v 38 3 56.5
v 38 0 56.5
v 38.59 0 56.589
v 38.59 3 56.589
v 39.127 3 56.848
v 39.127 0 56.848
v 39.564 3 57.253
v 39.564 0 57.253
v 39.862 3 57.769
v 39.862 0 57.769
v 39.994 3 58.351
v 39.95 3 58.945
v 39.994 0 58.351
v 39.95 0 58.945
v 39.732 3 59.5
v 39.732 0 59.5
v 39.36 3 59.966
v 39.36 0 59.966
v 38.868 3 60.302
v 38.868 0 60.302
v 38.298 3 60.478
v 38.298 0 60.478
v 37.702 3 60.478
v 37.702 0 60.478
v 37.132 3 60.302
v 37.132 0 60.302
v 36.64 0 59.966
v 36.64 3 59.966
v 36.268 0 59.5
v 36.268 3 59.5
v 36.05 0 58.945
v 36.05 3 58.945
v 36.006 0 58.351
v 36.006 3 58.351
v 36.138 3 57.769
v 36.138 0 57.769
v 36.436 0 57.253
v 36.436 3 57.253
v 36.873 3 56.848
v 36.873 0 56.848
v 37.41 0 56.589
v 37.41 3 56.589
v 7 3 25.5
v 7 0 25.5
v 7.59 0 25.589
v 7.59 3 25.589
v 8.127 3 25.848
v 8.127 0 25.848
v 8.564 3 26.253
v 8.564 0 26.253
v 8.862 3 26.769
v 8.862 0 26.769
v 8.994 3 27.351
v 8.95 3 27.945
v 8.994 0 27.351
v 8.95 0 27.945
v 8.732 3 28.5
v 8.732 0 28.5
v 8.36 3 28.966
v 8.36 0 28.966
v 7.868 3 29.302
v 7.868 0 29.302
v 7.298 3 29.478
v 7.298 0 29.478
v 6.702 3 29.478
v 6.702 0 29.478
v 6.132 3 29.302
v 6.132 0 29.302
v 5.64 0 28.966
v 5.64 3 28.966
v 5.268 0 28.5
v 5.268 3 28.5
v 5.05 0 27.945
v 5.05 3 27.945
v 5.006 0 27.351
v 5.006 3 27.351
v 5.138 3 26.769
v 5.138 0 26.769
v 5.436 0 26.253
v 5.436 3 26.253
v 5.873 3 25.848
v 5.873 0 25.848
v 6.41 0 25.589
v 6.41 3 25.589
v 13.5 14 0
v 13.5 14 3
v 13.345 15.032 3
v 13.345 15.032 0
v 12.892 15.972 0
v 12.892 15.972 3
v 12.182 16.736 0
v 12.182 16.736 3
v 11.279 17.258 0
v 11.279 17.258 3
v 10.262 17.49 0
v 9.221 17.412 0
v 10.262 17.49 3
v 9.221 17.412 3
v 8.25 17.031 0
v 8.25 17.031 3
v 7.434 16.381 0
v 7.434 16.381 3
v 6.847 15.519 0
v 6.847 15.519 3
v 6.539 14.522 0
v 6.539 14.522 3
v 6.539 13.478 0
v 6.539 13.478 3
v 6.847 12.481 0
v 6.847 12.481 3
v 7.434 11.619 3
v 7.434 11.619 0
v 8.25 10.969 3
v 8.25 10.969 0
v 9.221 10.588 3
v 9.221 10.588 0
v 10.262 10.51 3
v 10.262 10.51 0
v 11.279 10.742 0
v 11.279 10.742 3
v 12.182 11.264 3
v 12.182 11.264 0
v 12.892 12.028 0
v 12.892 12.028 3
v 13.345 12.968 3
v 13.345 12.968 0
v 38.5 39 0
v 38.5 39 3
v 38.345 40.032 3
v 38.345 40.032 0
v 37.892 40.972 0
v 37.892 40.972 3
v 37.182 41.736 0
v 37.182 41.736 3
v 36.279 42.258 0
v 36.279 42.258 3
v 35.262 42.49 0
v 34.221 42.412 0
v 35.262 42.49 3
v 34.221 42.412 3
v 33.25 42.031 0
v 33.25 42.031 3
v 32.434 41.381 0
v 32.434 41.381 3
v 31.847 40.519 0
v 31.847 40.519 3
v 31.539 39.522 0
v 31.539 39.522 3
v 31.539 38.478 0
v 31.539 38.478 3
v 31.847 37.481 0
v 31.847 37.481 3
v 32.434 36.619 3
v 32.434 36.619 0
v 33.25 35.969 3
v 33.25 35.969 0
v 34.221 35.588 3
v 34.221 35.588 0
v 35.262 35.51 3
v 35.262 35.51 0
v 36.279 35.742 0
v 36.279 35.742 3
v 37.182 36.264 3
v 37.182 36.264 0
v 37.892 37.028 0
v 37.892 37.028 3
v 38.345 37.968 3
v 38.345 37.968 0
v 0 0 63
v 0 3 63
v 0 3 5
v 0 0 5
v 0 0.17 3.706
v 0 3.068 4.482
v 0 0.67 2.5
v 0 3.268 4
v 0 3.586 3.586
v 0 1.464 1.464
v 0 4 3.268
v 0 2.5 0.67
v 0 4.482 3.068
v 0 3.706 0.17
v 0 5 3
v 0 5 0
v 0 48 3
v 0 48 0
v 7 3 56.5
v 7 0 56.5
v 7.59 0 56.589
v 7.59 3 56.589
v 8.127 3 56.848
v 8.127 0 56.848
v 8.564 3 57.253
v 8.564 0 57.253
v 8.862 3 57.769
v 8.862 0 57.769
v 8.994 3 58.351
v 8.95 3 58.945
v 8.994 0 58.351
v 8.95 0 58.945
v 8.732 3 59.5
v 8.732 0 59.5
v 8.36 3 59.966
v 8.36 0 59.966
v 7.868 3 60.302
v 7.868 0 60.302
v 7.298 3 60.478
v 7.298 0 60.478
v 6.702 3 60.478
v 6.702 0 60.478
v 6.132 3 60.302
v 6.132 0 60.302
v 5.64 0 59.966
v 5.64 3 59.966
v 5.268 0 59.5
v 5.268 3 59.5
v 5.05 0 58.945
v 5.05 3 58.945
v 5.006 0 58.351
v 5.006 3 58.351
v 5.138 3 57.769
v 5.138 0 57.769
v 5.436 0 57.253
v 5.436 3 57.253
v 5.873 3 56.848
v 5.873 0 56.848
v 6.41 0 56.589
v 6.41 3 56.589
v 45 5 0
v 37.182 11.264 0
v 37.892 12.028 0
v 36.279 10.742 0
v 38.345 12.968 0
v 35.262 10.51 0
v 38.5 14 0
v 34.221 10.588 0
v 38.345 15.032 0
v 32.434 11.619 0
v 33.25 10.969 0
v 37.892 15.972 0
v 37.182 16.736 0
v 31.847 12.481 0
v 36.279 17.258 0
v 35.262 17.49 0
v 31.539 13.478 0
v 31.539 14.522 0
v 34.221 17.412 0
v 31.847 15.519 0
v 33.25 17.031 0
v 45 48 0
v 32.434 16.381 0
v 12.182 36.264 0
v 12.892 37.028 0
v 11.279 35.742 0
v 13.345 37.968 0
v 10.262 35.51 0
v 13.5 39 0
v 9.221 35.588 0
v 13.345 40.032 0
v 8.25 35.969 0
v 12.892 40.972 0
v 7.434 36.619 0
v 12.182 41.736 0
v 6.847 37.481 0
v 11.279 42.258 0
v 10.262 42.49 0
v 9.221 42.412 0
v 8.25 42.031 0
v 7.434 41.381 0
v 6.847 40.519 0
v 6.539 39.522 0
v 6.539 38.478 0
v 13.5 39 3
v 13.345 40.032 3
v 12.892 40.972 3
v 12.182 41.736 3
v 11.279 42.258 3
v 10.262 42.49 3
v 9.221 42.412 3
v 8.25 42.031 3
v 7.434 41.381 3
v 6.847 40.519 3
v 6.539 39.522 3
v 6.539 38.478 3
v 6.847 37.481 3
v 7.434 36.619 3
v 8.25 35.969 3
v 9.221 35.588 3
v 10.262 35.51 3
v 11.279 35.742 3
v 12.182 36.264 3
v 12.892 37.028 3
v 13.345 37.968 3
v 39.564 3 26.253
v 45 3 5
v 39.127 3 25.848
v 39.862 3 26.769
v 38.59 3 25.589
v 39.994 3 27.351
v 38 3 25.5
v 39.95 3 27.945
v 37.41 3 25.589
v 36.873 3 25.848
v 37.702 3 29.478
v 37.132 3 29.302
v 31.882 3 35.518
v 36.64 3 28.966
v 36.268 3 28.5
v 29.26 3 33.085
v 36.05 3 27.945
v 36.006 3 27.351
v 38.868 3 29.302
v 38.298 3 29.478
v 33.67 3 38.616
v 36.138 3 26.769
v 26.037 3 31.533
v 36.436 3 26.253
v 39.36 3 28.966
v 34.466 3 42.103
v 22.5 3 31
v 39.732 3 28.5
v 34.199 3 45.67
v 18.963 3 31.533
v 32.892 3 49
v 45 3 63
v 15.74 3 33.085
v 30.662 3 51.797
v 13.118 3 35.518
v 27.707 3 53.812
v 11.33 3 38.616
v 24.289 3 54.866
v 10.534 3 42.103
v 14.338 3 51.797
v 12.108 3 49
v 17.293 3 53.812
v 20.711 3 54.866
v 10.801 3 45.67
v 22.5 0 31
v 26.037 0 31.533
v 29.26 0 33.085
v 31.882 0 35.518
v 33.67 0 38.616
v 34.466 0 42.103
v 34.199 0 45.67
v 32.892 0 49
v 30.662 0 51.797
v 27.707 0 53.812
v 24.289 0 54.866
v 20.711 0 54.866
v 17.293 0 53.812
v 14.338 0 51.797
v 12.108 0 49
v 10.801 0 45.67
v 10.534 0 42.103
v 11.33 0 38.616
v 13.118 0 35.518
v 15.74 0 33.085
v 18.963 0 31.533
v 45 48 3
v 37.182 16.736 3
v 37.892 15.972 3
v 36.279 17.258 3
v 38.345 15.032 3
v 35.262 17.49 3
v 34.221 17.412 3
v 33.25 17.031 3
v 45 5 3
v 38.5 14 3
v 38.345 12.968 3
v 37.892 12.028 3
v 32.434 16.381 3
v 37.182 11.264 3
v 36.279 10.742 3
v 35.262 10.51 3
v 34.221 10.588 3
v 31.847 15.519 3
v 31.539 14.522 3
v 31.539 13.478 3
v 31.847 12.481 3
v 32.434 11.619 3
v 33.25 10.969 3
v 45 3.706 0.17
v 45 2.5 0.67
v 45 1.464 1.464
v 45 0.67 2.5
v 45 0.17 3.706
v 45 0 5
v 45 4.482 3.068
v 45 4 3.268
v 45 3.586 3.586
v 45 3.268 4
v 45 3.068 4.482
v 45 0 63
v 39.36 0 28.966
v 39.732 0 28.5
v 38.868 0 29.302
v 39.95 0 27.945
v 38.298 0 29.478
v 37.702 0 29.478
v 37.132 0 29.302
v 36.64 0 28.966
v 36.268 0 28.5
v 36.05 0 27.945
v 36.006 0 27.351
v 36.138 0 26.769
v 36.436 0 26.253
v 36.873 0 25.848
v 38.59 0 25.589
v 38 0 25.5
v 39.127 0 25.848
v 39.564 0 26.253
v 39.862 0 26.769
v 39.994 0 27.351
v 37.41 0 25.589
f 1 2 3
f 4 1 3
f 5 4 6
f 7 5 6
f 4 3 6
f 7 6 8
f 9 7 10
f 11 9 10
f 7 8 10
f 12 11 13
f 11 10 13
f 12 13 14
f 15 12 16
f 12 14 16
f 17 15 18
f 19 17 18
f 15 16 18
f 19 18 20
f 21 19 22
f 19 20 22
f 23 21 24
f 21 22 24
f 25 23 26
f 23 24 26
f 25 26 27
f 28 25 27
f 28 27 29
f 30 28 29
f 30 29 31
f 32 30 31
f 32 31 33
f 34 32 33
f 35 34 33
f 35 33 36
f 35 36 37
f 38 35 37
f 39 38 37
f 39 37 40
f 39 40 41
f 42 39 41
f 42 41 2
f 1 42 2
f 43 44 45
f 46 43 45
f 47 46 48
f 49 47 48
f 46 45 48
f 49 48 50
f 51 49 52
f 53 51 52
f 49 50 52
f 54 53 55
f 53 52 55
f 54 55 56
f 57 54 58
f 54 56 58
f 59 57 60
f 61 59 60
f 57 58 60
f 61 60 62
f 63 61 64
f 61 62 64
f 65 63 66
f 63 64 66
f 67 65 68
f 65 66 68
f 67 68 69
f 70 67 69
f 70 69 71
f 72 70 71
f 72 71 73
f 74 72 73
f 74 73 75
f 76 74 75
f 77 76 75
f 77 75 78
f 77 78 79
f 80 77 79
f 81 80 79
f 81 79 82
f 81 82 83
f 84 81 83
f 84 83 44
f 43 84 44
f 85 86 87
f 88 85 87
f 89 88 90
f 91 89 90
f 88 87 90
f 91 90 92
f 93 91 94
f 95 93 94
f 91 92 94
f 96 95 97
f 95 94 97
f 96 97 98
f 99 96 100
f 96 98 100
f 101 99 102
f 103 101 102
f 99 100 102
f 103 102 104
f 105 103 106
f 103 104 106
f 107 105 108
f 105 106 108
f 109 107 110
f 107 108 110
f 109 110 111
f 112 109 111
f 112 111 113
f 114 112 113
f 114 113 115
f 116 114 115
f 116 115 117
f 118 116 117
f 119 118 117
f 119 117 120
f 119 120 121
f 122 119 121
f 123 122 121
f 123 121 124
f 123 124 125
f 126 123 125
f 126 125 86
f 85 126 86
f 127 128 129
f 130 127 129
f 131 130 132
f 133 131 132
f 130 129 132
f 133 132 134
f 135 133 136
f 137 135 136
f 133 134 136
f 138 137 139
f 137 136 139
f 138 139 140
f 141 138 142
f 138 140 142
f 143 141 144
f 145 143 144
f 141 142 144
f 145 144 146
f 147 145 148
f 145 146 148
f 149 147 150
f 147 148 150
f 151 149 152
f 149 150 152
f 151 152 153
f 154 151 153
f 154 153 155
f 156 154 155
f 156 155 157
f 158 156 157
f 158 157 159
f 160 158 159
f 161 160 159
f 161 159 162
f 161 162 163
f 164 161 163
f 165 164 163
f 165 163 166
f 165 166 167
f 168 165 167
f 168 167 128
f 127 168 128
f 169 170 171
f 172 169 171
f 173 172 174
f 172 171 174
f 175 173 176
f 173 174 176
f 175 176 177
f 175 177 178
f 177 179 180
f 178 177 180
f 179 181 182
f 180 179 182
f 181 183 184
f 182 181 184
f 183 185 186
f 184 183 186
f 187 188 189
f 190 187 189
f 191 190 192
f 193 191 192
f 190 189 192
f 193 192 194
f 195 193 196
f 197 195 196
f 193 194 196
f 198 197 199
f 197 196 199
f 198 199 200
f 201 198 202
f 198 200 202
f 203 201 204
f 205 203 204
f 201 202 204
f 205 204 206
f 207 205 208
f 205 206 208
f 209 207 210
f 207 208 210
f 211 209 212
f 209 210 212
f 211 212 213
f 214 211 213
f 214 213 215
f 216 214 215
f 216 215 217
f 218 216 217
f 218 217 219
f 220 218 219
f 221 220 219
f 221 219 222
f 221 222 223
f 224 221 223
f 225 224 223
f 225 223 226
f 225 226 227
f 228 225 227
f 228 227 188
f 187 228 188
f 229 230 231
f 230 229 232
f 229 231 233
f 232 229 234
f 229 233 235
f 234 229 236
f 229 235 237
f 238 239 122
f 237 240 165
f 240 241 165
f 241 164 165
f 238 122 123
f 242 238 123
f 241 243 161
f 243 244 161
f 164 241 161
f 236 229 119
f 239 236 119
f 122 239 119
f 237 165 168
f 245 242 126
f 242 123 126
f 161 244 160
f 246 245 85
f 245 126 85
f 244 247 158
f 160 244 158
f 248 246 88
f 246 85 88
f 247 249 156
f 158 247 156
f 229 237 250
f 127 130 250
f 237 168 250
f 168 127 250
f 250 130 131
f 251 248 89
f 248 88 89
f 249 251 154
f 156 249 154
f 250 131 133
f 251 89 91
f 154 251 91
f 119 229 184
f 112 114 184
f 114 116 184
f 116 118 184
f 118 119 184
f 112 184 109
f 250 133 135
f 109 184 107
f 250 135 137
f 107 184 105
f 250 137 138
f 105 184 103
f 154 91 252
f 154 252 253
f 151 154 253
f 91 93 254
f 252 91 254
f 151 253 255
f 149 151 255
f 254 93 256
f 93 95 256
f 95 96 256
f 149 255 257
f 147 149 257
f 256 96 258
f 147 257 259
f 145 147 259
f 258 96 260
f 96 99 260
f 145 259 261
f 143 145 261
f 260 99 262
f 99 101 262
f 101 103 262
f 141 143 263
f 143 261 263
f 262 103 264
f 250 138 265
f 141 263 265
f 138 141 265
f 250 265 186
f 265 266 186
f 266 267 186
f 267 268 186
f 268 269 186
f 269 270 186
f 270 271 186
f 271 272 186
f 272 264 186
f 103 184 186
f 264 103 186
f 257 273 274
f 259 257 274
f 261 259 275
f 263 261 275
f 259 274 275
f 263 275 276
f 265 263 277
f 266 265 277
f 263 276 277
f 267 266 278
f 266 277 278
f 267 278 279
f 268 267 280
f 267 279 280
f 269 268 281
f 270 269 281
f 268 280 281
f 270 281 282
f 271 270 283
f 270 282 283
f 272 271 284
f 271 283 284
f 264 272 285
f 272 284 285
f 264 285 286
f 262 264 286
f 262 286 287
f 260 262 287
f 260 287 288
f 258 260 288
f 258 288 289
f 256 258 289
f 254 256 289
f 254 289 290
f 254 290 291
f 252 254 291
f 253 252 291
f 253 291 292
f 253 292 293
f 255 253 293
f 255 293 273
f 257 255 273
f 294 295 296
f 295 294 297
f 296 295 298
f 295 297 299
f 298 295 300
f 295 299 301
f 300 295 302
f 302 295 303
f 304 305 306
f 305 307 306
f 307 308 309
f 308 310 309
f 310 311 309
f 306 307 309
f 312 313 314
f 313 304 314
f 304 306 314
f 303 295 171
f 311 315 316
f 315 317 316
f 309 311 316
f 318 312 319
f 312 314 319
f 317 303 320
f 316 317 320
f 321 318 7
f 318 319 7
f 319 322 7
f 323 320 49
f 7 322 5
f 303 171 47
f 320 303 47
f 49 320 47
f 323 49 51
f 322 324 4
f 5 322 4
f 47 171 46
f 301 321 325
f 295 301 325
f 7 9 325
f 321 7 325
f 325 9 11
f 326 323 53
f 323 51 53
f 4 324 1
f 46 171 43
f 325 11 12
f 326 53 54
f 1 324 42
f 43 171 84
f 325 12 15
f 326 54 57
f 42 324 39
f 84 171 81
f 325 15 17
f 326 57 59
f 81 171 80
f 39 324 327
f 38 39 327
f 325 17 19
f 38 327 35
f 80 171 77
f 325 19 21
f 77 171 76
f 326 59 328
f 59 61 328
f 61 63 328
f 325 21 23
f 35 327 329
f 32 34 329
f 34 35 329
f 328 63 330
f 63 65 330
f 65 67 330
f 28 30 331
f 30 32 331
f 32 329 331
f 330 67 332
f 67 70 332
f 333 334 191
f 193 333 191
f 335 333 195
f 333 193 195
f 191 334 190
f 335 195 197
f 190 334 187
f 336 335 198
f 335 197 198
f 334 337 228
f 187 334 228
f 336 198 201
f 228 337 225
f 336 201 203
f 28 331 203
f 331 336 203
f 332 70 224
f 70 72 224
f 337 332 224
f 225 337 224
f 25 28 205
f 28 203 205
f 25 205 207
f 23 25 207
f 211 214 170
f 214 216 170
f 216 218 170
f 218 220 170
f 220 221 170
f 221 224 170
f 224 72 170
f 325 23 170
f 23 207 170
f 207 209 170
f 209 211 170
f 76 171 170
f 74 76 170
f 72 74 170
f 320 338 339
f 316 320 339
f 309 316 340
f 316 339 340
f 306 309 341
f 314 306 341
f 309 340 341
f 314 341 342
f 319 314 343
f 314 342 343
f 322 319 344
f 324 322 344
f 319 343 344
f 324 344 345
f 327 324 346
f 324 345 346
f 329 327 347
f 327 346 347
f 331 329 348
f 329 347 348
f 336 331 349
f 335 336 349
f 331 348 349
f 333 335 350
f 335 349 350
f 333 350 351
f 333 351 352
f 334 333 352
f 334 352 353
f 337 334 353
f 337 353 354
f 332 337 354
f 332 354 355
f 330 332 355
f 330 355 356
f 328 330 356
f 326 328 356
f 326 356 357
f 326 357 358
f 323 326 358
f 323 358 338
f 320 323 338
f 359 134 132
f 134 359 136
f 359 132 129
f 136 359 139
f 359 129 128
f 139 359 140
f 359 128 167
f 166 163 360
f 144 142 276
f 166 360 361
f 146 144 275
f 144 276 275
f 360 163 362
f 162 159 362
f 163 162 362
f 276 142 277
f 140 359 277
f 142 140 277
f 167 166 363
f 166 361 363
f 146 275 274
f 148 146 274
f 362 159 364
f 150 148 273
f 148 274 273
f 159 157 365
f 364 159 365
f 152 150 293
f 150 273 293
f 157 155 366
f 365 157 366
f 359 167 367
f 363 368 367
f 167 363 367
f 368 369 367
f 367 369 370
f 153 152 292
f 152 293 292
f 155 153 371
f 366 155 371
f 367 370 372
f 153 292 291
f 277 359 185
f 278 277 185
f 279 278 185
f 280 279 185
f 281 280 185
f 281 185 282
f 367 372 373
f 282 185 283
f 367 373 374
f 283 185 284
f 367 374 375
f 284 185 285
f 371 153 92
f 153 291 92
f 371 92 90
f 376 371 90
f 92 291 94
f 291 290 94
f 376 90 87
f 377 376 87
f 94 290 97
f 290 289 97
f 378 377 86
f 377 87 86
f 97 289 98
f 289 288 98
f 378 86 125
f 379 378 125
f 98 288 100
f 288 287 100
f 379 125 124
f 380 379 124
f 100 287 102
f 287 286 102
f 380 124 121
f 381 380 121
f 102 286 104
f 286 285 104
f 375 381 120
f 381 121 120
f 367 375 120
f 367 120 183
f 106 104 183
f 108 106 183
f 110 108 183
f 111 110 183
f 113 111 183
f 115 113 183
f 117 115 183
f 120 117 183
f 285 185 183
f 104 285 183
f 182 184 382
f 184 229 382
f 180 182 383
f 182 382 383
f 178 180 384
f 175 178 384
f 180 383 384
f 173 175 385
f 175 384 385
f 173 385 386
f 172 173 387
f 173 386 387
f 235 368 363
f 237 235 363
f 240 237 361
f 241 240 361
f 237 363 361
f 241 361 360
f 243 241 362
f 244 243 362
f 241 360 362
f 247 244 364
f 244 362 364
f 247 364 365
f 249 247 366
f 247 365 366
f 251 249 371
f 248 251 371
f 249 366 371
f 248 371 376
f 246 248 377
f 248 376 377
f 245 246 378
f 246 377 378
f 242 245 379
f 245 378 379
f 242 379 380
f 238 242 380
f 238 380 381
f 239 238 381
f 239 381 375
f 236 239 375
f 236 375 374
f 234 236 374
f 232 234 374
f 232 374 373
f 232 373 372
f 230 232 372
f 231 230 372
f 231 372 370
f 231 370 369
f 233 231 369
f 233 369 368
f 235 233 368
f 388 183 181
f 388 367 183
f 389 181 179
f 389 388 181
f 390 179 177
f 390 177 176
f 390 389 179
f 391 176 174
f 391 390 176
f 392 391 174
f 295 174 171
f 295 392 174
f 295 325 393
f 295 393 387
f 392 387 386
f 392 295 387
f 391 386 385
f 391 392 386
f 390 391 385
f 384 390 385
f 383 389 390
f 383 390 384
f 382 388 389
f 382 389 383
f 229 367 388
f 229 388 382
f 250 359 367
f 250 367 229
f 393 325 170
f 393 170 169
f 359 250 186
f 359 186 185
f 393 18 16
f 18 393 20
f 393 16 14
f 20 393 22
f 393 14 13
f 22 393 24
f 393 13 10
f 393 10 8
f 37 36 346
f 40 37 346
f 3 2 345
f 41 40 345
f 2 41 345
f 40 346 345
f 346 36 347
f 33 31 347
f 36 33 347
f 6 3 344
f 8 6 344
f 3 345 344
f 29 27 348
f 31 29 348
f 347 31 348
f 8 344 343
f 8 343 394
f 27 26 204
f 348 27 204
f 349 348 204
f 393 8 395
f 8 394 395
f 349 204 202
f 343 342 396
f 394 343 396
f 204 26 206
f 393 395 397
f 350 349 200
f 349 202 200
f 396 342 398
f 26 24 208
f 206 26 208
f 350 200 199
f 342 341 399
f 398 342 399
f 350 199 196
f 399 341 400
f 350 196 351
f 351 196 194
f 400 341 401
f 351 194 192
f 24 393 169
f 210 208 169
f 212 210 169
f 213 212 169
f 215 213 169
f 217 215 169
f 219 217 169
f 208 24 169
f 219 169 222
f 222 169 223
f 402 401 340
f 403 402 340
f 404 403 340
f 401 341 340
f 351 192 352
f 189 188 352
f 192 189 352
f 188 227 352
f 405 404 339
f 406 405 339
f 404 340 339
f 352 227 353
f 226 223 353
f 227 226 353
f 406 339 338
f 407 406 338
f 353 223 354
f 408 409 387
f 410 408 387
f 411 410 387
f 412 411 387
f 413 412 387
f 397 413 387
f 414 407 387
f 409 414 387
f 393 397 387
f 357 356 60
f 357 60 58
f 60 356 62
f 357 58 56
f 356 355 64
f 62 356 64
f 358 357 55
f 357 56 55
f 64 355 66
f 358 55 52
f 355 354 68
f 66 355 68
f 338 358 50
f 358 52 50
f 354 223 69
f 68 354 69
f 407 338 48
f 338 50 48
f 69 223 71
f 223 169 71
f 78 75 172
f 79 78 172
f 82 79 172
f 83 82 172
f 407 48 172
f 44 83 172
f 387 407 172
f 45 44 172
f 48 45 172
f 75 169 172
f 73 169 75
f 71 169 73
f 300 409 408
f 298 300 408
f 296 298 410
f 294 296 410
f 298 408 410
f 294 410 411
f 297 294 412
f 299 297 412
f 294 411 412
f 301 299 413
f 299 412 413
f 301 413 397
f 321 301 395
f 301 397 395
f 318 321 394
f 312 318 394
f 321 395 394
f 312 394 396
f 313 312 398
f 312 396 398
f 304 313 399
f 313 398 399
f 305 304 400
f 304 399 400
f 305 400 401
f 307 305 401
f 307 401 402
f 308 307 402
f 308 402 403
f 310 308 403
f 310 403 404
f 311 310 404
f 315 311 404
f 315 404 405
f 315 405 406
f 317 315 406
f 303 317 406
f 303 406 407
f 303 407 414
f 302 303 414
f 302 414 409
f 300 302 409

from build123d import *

# Parameters (mm, degrees)
BOSS_EXTRUDE1_DEPTH = 45
FILLET1_R           = 2
FILLET2_R           = 5
CUT_EXTRUDE1_REACH  = 93.093
SKETCH2_R           = 2
SKETCH2_R_2         = 12
SKETCH3_R           = 3.5
CUT_EXTRUDE2_DEPTH  = 90.044932478


with BuildPart() as part:
    # Sketch1 → Boss-Extrude1 (new body)
    with BuildSketch(Plane(origin=(0, 0, 0), x_dir=(0, 0, -1), z_dir=(1, 0, 0))):
        Polygon((0, 0), (0, 48), (-3, 48), (-3, 3), (-63, 3), (-63, 0), align=None)
    extrude(amount=BOSS_EXTRUDE1_DEPTH)

    # Fillet1
    fillet1_edges = [part.edges().sort_by_distance(p)[0] for p in [
        (22.5, 3, 3),
    ]]
    fillet(fillet1_edges, radius=FILLET1_R)

    # Fillet2
    fillet2_edges = [part.edges().sort_by_distance(p)[0] for p in [
        (22.5, 0, 0),
    ]]
    fillet(fillet2_edges, radius=FILLET2_R)

    # Sketch2 → Cut-Extrude1 (cut, up to next)
    with BuildSketch(Plane.XZ, mode=Mode.PRIVATE) as cut_extrude1_sk1:
        with Locations(Location((38, 58.5, 0), (0, 0, 270))):
            Circle(SKETCH2_R)
    cut_extrude1_tool1 = extrude(cut_extrude1_sk1.sketch, amount=-CUT_EXTRUDE1_REACH, mode=Mode.PRIVATE) & part.part
    # Sketch2 → Cut-Extrude1 (cut, up to next)
    with BuildSketch(Plane.XZ, mode=Mode.PRIVATE) as cut_extrude1_sk2:
        with Locations(Location((38, 27.5, 0), (0, 0, 270))):
            Circle(SKETCH2_R)
    cut_extrude1_tool2 = extrude(cut_extrude1_sk2.sketch, amount=-CUT_EXTRUDE1_REACH, mode=Mode.PRIVATE) & part.part
    # Sketch2 → Cut-Extrude1 (cut, up to next)
    with BuildSketch(Plane.XZ, mode=Mode.PRIVATE) as cut_extrude1_sk3:
        with Locations(Location((7, 58.5, 0), (0, 0, 270))):
            Circle(SKETCH2_R)
    cut_extrude1_tool3 = extrude(cut_extrude1_sk3.sketch, amount=-CUT_EXTRUDE1_REACH, mode=Mode.PRIVATE) & part.part
    # Sketch2 → Cut-Extrude1 (cut, up to next)
    with BuildSketch(Plane.XZ, mode=Mode.PRIVATE) as cut_extrude1_sk4:
        with Locations(Location((7, 27.5, 0), (0, 0, 270))):
            Circle(SKETCH2_R)
    cut_extrude1_tool4 = extrude(cut_extrude1_sk4.sketch, amount=-CUT_EXTRUDE1_REACH, mode=Mode.PRIVATE) & part.part
    # Sketch2 → Cut-Extrude1 (cut, up to next)
    with BuildSketch(Plane.XZ, mode=Mode.PRIVATE) as cut_extrude1_sk5:
        with Locations(Location((22.5, 43, 0), (0, 0, 270))):
            Circle(SKETCH2_R_2)
    cut_extrude1_tool5 = extrude(cut_extrude1_sk5.sketch, amount=-CUT_EXTRUDE1_REACH, mode=Mode.PRIVATE) & part.part
    add(cut_extrude1_tool1.solids().sort_by_distance((38, 0, 58.5))[0], mode=Mode.SUBTRACT)
    add(cut_extrude1_tool2.solids().sort_by_distance((38, 0, 27.5))[0], mode=Mode.SUBTRACT)
    add(cut_extrude1_tool3.solids().sort_by_distance((7, 0, 58.5))[0], mode=Mode.SUBTRACT)
    add(cut_extrude1_tool4.solids().sort_by_distance((7, 0, 27.5))[0], mode=Mode.SUBTRACT)
    add(cut_extrude1_tool5.solids().sort_by_distance((22.5, 0, 43))[0], mode=Mode.SUBTRACT)

    # Sketch3 → Cut-Extrude2 (cut, through all)
    with BuildSketch(Plane.XY.offset(3)):
        with Locations((35, 39)):
            Circle(SKETCH3_R)
        with Locations((35, 14)):
            Circle(SKETCH3_R)
        with Locations((10, 39)):
            Circle(SKETCH3_R)
        with Locations((10, 14)):
            Circle(SKETCH3_R)
    extrude(amount=-CUT_EXTRUDE2_DEPTH, mode=Mode.SUBTRACT)


solid = part.part
